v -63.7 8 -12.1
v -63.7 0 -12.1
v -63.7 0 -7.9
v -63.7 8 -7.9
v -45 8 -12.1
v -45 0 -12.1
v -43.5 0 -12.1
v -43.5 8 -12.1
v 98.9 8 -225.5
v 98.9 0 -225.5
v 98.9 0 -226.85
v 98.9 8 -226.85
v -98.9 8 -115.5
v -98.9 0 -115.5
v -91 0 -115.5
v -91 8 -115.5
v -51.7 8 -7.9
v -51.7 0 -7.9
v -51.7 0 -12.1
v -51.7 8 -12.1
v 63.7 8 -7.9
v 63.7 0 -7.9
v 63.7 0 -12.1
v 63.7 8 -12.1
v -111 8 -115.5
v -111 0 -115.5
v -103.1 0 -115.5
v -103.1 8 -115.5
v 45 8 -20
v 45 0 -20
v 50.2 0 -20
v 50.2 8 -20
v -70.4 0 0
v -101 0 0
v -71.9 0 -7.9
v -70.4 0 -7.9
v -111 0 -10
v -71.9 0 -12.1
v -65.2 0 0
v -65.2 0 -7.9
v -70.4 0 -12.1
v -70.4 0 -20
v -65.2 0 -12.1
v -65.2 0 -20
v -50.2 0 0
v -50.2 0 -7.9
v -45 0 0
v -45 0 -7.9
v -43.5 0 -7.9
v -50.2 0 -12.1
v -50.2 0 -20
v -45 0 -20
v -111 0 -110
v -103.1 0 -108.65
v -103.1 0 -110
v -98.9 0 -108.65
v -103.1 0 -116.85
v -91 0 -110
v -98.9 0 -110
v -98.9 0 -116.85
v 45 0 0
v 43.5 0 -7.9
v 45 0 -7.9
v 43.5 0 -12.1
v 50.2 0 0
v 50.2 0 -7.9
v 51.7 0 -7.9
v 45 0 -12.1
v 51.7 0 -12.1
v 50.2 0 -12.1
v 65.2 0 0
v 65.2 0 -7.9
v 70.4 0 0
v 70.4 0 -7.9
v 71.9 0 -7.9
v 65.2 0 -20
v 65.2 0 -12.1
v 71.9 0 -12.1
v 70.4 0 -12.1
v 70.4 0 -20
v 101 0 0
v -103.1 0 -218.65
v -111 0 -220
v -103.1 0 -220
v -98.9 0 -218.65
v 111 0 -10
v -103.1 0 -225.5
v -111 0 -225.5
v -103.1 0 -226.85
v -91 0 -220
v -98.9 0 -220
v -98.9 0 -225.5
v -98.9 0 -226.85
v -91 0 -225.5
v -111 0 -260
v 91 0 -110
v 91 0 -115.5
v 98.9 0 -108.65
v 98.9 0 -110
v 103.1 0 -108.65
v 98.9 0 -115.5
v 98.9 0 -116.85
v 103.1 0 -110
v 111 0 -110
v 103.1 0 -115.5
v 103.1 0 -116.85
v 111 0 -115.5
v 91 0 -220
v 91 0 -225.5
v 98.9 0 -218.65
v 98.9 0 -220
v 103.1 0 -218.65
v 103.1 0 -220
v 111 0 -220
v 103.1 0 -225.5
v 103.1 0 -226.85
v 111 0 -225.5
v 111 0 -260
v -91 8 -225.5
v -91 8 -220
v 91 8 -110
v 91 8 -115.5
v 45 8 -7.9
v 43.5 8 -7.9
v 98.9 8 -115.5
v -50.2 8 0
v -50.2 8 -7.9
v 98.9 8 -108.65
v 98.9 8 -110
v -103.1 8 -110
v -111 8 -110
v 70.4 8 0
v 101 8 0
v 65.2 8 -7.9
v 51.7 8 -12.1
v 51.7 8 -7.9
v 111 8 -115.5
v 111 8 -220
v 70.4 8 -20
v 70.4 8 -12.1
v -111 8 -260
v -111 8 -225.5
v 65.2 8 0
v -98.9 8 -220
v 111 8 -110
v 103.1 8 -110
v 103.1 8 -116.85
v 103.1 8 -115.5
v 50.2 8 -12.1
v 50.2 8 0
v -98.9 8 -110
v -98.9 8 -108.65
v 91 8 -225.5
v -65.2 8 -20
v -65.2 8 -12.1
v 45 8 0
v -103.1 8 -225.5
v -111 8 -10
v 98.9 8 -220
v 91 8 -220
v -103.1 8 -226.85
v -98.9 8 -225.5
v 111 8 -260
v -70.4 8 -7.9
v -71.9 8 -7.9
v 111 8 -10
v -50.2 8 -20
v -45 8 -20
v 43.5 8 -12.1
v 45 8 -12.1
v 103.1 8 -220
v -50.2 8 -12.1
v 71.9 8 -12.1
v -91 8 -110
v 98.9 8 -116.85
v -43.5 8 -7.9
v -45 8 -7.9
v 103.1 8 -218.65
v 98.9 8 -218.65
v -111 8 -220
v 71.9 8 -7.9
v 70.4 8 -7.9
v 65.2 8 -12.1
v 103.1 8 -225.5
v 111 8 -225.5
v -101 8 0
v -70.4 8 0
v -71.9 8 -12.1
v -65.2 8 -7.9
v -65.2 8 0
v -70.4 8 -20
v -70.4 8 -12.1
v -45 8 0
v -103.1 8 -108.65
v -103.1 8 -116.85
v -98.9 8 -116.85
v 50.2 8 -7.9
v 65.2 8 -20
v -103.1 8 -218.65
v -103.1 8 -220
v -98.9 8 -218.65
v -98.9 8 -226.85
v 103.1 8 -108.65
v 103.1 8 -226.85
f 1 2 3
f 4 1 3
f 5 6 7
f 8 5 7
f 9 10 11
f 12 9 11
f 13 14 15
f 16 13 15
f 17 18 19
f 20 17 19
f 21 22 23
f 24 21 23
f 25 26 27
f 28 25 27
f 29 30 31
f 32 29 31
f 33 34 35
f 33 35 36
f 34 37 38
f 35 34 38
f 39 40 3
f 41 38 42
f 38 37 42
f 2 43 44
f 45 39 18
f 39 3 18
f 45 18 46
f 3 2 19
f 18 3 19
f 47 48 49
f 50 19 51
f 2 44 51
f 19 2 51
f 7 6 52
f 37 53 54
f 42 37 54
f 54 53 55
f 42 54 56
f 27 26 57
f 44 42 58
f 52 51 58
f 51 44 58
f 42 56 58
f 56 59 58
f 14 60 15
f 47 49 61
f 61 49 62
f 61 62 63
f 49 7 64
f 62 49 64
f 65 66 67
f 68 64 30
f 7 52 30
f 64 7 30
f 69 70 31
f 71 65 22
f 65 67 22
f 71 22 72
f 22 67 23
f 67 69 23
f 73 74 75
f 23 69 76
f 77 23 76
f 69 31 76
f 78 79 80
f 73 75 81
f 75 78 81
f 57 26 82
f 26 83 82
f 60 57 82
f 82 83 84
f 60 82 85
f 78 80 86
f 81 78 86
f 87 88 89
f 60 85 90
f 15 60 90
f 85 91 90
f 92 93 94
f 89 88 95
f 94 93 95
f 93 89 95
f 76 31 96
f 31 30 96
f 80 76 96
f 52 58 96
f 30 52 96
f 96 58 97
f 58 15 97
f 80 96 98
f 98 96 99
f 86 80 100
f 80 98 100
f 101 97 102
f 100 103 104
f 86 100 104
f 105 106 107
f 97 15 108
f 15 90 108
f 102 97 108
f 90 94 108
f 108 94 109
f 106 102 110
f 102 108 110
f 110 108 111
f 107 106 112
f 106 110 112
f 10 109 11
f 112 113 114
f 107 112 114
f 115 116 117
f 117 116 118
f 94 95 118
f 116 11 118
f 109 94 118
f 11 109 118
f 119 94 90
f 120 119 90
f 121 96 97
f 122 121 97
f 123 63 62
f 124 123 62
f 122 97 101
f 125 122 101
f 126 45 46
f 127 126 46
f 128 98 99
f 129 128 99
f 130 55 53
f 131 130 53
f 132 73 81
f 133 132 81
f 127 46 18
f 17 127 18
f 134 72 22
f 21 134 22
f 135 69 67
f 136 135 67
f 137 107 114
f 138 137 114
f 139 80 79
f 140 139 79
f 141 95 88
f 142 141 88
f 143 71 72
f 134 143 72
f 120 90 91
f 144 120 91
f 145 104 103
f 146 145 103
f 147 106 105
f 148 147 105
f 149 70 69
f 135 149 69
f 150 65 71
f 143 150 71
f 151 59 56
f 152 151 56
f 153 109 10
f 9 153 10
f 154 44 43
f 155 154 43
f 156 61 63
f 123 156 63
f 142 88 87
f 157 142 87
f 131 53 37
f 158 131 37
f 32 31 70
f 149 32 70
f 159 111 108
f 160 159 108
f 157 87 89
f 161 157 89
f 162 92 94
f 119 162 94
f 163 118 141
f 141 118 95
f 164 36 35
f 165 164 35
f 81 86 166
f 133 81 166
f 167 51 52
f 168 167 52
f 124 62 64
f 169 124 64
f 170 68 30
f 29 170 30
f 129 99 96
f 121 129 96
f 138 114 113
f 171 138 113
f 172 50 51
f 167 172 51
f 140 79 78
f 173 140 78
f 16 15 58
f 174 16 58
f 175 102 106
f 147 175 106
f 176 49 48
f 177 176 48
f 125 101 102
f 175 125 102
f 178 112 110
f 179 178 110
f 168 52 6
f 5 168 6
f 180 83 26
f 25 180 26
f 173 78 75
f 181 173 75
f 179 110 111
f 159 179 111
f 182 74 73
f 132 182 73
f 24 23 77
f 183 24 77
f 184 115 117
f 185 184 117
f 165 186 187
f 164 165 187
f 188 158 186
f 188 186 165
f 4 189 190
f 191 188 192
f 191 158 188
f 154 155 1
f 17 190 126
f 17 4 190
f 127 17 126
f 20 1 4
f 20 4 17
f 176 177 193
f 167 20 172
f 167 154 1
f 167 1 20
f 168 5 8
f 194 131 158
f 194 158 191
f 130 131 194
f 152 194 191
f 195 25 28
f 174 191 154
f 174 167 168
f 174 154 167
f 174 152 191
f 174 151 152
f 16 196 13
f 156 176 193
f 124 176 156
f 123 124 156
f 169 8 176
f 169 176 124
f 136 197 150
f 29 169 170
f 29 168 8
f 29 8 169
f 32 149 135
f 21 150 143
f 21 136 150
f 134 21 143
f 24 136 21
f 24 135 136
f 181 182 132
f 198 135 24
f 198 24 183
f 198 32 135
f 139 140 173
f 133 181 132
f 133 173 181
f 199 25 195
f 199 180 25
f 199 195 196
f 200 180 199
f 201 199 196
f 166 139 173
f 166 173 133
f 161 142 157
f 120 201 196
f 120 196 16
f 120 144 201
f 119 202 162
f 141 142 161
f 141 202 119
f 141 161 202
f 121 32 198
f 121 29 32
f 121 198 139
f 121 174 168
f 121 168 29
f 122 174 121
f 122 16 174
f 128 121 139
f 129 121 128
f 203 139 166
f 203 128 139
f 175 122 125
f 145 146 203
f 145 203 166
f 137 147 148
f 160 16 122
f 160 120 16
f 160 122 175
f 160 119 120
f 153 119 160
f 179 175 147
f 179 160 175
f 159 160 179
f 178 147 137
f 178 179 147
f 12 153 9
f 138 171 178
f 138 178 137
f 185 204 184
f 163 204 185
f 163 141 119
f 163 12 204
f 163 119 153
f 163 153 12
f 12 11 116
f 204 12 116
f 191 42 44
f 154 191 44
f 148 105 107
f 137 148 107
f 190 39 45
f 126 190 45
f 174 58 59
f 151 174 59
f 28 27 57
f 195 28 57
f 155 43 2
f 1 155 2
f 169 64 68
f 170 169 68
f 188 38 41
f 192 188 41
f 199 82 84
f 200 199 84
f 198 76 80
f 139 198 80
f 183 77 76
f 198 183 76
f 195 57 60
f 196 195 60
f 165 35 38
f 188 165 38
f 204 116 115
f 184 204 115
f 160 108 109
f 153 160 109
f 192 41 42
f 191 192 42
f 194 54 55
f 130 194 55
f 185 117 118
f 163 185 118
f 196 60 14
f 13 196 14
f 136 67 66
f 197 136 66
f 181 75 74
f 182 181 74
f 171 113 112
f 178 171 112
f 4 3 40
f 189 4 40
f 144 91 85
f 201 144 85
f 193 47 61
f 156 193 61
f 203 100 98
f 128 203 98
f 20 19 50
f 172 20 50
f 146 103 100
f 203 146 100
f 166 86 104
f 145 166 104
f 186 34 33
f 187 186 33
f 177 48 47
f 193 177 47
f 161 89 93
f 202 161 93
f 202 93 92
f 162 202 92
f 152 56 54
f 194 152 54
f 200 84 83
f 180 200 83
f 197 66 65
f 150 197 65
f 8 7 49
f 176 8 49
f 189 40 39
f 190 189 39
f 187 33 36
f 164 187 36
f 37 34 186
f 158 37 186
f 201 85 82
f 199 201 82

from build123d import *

# Parameters (mm, degrees)
EXTRUDE_1_DEPTH = 8
CHAMFER_1_SIZE  = 10


with BuildPart() as part:
    # Эскиз2 → Бобышка-Вытянуть1 (new body)
    with BuildSketch(Plane(origin=(0, 0, 0), x_dir=(1, 0, 0), z_dir=(0, 1, 0))):
        Polygon((-111, 110), (-111, 0), (-70.4, 0), (-70.4, 7.9), (-71.9, 7.9), (-71.9, 12.1), (-70.4, 12.1), (-70.4, 20), (-65.2, 20), (-65.2, 12.1), (-63.7, 12.1), (-63.7, 7.9), (-65.2, 7.9), (-65.2, 0), (-50.2, 0), (-50.2, 7.9), (-51.7, 7.9), (-51.7, 12.1), (-50.2, 12.1), (-50.2, 20), (-45, 20), (-45, 12.1), (-43.5, 12.1), (-43.5, 7.9), (-45, 7.9), (-45, 0), (45, 0), (45, 7.9), (43.5, 7.9), (43.5, 12.1), (45, 12.1), (45, 20), (50.2, 20), (50.2, 12.1), (51.7, 12.1), (51.7, 7.9), (50.2, 7.9), (50.2, 0), (65.2, 0), (65.2, 7.9), (63.7, 7.9), (63.7, 12.1), (65.2, 12.1), (65.2, 20), (70.4, 20), (70.4, 12.1), (71.9, 12.1), (71.9, 7.9), (70.4, 7.9), (70.4, 0), (111, 0), (111, 110), (103.1, 110), (103.1, 108.65), (98.9, 108.65), (98.9, 110), (91, 110), (91, 115.5), (98.9, 115.5), (98.9, 116.85), (103.1, 116.85), (103.1, 115.5), (111, 115.5), (111, 220), (103.1, 220), (103.1, 218.65), (98.9, 218.65), (98.9, 220), (91, 220), (91, 225.5), (98.9, 225.5), (98.9, 226.85), (103.1, 226.85), (103.1, 225.5), (111, 225.5), (111, 260), (-111, 260), (-111, 225.5), (-103.1, 225.5), (-103.1, 226.85), (-98.9, 226.85), (-98.9, 225.5), (-91, 225.5), (-91, 220), (-98.9, 220), (-98.9, 218.65), (-103.1, 218.65), (-103.1, 220), (-111, 220), (-111, 115.5), (-103.1, 115.5), (-103.1, 116.85), (-98.9, 116.85), (-98.9, 115.5), (-91, 115.5), (-91, 110), (-98.9, 110), (-98.9, 108.65), (-103.1, 108.65), (-103.1, 110), align=None)
    extrude(amount=EXTRUDE_1_DEPTH)

    # Фаска1
    chamfer_1_edges = [part.edges().sort_by_distance(p)[0] for p in [
        (111, 4, 0),
        (-111, 4, 0),
    ]]
    chamfer(chamfer_1_edges, length=CHAMFER_1_SIZE)


solid = part.part
